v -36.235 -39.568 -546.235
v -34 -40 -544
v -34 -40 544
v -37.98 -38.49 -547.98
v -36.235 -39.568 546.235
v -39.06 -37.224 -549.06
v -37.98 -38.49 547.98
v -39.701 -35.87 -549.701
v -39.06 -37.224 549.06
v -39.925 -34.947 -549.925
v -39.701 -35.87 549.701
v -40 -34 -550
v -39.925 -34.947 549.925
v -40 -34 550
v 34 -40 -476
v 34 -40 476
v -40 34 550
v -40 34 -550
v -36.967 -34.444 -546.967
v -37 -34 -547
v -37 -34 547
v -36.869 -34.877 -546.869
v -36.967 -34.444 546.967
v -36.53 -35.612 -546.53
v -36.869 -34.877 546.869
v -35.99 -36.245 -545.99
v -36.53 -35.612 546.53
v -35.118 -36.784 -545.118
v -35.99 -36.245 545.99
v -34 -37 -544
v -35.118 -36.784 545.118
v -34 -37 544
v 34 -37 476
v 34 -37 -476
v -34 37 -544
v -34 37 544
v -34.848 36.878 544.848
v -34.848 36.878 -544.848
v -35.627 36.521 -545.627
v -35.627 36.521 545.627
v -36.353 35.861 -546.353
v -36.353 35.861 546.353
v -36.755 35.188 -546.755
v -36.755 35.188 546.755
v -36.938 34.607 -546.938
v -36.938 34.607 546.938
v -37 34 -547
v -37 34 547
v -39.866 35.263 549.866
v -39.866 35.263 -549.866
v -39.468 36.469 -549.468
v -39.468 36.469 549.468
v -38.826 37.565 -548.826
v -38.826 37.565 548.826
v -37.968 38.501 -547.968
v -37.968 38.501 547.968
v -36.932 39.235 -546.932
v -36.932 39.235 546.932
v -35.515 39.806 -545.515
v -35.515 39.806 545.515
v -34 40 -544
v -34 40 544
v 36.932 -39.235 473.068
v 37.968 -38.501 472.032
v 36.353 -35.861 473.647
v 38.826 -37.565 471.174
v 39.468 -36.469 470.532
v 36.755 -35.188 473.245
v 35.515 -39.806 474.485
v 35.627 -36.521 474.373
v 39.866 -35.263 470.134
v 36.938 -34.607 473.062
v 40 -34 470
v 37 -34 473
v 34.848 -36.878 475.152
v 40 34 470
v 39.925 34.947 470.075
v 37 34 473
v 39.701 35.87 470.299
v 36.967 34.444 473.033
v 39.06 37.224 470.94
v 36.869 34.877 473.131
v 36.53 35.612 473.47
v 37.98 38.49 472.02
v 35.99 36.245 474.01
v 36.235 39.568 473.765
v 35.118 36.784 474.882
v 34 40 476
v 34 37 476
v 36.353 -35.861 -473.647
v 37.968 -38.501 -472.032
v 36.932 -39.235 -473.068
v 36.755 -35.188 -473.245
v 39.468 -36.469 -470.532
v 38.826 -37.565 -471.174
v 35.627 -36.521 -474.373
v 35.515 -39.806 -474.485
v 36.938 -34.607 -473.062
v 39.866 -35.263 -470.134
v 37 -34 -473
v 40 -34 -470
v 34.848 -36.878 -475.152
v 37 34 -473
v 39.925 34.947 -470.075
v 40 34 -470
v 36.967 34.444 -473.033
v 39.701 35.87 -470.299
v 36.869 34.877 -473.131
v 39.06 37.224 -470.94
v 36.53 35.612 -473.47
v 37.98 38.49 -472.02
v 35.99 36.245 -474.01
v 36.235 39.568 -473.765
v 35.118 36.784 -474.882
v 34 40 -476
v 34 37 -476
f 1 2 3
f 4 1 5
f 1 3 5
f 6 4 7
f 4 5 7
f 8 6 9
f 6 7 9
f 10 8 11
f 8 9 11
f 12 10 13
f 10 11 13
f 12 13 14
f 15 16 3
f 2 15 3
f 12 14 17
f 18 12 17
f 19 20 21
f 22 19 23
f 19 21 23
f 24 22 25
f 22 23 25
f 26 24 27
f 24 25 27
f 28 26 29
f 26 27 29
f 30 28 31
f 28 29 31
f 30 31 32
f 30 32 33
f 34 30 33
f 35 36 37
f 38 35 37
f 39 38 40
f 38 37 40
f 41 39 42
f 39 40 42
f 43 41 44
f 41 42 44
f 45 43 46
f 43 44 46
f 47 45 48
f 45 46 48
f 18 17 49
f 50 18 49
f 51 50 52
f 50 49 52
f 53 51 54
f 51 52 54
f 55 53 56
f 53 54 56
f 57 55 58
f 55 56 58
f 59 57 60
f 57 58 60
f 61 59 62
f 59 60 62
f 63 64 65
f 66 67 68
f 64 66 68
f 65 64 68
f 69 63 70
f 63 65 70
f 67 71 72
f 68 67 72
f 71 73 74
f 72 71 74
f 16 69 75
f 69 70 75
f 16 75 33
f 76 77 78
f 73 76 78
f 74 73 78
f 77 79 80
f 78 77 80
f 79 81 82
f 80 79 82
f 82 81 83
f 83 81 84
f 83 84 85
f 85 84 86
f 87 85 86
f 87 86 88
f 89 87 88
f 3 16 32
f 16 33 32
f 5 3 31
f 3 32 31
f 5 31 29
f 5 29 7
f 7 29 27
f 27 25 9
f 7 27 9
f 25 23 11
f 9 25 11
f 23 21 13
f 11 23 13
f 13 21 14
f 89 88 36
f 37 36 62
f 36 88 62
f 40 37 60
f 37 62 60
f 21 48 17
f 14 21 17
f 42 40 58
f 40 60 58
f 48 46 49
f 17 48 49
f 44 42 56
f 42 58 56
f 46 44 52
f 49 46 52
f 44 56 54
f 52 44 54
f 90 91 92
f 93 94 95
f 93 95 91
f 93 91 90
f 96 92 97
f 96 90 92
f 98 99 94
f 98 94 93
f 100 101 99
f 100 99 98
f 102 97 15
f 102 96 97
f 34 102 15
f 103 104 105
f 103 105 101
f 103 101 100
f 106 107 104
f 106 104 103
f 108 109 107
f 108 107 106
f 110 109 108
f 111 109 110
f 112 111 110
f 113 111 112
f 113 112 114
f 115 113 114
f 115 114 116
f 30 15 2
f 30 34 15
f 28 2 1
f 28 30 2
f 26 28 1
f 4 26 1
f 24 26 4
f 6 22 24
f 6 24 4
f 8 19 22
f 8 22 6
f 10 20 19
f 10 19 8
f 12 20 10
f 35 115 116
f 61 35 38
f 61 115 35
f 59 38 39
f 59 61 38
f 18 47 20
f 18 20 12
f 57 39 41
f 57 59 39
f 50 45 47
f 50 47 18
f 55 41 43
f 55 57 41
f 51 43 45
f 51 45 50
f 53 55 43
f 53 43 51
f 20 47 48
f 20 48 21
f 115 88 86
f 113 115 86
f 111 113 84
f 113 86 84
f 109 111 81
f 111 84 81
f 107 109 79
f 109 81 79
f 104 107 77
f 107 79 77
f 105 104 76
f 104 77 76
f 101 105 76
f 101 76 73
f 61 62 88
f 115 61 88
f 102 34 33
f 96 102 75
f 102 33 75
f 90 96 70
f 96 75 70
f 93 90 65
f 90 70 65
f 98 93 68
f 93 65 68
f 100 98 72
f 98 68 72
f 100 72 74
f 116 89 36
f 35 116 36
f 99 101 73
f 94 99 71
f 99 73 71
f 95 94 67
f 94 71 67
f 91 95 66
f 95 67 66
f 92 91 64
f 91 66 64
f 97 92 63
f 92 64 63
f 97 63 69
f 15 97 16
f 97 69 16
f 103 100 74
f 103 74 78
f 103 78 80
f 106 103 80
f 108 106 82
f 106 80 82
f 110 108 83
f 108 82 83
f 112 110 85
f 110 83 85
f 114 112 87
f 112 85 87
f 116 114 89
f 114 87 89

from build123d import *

# Parameters (mm, degrees)
AUFSATZ_LINEAR_AUSTRAGEN1_DEPTH = 550
SCHNITT_LINEAR_AUSTRAGEN1_DEPTH = 140


with BuildPart() as part:
    # Skizze1 → Aufsatz-Linear austragen1 (new, symmetric)
    with BuildSketch(Plane.XY):
        with BuildLine():
            Line((-34, 40), (34, 40))
            ThreePointArc((34, 40), (38.242640687, 38.242640687), (40, 34))
            Line((40, 34), (40, -34))
            ThreePointArc((40, -34), (38.242640687, -38.242640687), (34, -40))
            Line((34, -40), (-34, -40))
            ThreePointArc((-34, -40), (-38.242640687, -38.242640687), (-40, -34))
            Line((-40, -34), (-40, 34))
            ThreePointArc((-40, 34), (-38.242640687, 38.242640687), (-34, 40))
        make_face()
        with BuildLine():
            Line((-37, 34), (-37, -34))
            ThreePointArc((-37, -34), (-36.121320344, -36.121320344), (-34, -37))
            Line((-34, -37), (34, -37))
            ThreePointArc((34, -37), (36.121320344, -36.121320344), (37, -34))
            Line((37, -34), (37, 34))
            ThreePointArc((37, 34), (36.121320344, 36.121320344), (34, 37))
            Line((34, 37), (-34, 37))
            ThreePointArc((-34, 37), (-36.121320344, 36.121320344), (-37, 34))
        make_face(mode=Mode.SUBTRACT)
    extrude(amount=AUFSATZ_LINEAR_AUSTRAGEN1_DEPTH, both=True)

    # Skizze2 → Schnitt-Linear austragen1 (cut)
    with BuildSketch(Plane(origin=(0, 40, 0), x_dir=(1, 0, 0), z_dir=(0, 1, 0))):
        Polygon((-40, 550), (40, 550), (40, 470), align=None)
        Polygon((40, -470), (-40, -550), (40, -550), align=None)
    extrude(amount=-SCHNITT_LINEAR_AUSTRAGEN1_DEPTH, mode=Mode.SUBTRACT)


solid = part.part
